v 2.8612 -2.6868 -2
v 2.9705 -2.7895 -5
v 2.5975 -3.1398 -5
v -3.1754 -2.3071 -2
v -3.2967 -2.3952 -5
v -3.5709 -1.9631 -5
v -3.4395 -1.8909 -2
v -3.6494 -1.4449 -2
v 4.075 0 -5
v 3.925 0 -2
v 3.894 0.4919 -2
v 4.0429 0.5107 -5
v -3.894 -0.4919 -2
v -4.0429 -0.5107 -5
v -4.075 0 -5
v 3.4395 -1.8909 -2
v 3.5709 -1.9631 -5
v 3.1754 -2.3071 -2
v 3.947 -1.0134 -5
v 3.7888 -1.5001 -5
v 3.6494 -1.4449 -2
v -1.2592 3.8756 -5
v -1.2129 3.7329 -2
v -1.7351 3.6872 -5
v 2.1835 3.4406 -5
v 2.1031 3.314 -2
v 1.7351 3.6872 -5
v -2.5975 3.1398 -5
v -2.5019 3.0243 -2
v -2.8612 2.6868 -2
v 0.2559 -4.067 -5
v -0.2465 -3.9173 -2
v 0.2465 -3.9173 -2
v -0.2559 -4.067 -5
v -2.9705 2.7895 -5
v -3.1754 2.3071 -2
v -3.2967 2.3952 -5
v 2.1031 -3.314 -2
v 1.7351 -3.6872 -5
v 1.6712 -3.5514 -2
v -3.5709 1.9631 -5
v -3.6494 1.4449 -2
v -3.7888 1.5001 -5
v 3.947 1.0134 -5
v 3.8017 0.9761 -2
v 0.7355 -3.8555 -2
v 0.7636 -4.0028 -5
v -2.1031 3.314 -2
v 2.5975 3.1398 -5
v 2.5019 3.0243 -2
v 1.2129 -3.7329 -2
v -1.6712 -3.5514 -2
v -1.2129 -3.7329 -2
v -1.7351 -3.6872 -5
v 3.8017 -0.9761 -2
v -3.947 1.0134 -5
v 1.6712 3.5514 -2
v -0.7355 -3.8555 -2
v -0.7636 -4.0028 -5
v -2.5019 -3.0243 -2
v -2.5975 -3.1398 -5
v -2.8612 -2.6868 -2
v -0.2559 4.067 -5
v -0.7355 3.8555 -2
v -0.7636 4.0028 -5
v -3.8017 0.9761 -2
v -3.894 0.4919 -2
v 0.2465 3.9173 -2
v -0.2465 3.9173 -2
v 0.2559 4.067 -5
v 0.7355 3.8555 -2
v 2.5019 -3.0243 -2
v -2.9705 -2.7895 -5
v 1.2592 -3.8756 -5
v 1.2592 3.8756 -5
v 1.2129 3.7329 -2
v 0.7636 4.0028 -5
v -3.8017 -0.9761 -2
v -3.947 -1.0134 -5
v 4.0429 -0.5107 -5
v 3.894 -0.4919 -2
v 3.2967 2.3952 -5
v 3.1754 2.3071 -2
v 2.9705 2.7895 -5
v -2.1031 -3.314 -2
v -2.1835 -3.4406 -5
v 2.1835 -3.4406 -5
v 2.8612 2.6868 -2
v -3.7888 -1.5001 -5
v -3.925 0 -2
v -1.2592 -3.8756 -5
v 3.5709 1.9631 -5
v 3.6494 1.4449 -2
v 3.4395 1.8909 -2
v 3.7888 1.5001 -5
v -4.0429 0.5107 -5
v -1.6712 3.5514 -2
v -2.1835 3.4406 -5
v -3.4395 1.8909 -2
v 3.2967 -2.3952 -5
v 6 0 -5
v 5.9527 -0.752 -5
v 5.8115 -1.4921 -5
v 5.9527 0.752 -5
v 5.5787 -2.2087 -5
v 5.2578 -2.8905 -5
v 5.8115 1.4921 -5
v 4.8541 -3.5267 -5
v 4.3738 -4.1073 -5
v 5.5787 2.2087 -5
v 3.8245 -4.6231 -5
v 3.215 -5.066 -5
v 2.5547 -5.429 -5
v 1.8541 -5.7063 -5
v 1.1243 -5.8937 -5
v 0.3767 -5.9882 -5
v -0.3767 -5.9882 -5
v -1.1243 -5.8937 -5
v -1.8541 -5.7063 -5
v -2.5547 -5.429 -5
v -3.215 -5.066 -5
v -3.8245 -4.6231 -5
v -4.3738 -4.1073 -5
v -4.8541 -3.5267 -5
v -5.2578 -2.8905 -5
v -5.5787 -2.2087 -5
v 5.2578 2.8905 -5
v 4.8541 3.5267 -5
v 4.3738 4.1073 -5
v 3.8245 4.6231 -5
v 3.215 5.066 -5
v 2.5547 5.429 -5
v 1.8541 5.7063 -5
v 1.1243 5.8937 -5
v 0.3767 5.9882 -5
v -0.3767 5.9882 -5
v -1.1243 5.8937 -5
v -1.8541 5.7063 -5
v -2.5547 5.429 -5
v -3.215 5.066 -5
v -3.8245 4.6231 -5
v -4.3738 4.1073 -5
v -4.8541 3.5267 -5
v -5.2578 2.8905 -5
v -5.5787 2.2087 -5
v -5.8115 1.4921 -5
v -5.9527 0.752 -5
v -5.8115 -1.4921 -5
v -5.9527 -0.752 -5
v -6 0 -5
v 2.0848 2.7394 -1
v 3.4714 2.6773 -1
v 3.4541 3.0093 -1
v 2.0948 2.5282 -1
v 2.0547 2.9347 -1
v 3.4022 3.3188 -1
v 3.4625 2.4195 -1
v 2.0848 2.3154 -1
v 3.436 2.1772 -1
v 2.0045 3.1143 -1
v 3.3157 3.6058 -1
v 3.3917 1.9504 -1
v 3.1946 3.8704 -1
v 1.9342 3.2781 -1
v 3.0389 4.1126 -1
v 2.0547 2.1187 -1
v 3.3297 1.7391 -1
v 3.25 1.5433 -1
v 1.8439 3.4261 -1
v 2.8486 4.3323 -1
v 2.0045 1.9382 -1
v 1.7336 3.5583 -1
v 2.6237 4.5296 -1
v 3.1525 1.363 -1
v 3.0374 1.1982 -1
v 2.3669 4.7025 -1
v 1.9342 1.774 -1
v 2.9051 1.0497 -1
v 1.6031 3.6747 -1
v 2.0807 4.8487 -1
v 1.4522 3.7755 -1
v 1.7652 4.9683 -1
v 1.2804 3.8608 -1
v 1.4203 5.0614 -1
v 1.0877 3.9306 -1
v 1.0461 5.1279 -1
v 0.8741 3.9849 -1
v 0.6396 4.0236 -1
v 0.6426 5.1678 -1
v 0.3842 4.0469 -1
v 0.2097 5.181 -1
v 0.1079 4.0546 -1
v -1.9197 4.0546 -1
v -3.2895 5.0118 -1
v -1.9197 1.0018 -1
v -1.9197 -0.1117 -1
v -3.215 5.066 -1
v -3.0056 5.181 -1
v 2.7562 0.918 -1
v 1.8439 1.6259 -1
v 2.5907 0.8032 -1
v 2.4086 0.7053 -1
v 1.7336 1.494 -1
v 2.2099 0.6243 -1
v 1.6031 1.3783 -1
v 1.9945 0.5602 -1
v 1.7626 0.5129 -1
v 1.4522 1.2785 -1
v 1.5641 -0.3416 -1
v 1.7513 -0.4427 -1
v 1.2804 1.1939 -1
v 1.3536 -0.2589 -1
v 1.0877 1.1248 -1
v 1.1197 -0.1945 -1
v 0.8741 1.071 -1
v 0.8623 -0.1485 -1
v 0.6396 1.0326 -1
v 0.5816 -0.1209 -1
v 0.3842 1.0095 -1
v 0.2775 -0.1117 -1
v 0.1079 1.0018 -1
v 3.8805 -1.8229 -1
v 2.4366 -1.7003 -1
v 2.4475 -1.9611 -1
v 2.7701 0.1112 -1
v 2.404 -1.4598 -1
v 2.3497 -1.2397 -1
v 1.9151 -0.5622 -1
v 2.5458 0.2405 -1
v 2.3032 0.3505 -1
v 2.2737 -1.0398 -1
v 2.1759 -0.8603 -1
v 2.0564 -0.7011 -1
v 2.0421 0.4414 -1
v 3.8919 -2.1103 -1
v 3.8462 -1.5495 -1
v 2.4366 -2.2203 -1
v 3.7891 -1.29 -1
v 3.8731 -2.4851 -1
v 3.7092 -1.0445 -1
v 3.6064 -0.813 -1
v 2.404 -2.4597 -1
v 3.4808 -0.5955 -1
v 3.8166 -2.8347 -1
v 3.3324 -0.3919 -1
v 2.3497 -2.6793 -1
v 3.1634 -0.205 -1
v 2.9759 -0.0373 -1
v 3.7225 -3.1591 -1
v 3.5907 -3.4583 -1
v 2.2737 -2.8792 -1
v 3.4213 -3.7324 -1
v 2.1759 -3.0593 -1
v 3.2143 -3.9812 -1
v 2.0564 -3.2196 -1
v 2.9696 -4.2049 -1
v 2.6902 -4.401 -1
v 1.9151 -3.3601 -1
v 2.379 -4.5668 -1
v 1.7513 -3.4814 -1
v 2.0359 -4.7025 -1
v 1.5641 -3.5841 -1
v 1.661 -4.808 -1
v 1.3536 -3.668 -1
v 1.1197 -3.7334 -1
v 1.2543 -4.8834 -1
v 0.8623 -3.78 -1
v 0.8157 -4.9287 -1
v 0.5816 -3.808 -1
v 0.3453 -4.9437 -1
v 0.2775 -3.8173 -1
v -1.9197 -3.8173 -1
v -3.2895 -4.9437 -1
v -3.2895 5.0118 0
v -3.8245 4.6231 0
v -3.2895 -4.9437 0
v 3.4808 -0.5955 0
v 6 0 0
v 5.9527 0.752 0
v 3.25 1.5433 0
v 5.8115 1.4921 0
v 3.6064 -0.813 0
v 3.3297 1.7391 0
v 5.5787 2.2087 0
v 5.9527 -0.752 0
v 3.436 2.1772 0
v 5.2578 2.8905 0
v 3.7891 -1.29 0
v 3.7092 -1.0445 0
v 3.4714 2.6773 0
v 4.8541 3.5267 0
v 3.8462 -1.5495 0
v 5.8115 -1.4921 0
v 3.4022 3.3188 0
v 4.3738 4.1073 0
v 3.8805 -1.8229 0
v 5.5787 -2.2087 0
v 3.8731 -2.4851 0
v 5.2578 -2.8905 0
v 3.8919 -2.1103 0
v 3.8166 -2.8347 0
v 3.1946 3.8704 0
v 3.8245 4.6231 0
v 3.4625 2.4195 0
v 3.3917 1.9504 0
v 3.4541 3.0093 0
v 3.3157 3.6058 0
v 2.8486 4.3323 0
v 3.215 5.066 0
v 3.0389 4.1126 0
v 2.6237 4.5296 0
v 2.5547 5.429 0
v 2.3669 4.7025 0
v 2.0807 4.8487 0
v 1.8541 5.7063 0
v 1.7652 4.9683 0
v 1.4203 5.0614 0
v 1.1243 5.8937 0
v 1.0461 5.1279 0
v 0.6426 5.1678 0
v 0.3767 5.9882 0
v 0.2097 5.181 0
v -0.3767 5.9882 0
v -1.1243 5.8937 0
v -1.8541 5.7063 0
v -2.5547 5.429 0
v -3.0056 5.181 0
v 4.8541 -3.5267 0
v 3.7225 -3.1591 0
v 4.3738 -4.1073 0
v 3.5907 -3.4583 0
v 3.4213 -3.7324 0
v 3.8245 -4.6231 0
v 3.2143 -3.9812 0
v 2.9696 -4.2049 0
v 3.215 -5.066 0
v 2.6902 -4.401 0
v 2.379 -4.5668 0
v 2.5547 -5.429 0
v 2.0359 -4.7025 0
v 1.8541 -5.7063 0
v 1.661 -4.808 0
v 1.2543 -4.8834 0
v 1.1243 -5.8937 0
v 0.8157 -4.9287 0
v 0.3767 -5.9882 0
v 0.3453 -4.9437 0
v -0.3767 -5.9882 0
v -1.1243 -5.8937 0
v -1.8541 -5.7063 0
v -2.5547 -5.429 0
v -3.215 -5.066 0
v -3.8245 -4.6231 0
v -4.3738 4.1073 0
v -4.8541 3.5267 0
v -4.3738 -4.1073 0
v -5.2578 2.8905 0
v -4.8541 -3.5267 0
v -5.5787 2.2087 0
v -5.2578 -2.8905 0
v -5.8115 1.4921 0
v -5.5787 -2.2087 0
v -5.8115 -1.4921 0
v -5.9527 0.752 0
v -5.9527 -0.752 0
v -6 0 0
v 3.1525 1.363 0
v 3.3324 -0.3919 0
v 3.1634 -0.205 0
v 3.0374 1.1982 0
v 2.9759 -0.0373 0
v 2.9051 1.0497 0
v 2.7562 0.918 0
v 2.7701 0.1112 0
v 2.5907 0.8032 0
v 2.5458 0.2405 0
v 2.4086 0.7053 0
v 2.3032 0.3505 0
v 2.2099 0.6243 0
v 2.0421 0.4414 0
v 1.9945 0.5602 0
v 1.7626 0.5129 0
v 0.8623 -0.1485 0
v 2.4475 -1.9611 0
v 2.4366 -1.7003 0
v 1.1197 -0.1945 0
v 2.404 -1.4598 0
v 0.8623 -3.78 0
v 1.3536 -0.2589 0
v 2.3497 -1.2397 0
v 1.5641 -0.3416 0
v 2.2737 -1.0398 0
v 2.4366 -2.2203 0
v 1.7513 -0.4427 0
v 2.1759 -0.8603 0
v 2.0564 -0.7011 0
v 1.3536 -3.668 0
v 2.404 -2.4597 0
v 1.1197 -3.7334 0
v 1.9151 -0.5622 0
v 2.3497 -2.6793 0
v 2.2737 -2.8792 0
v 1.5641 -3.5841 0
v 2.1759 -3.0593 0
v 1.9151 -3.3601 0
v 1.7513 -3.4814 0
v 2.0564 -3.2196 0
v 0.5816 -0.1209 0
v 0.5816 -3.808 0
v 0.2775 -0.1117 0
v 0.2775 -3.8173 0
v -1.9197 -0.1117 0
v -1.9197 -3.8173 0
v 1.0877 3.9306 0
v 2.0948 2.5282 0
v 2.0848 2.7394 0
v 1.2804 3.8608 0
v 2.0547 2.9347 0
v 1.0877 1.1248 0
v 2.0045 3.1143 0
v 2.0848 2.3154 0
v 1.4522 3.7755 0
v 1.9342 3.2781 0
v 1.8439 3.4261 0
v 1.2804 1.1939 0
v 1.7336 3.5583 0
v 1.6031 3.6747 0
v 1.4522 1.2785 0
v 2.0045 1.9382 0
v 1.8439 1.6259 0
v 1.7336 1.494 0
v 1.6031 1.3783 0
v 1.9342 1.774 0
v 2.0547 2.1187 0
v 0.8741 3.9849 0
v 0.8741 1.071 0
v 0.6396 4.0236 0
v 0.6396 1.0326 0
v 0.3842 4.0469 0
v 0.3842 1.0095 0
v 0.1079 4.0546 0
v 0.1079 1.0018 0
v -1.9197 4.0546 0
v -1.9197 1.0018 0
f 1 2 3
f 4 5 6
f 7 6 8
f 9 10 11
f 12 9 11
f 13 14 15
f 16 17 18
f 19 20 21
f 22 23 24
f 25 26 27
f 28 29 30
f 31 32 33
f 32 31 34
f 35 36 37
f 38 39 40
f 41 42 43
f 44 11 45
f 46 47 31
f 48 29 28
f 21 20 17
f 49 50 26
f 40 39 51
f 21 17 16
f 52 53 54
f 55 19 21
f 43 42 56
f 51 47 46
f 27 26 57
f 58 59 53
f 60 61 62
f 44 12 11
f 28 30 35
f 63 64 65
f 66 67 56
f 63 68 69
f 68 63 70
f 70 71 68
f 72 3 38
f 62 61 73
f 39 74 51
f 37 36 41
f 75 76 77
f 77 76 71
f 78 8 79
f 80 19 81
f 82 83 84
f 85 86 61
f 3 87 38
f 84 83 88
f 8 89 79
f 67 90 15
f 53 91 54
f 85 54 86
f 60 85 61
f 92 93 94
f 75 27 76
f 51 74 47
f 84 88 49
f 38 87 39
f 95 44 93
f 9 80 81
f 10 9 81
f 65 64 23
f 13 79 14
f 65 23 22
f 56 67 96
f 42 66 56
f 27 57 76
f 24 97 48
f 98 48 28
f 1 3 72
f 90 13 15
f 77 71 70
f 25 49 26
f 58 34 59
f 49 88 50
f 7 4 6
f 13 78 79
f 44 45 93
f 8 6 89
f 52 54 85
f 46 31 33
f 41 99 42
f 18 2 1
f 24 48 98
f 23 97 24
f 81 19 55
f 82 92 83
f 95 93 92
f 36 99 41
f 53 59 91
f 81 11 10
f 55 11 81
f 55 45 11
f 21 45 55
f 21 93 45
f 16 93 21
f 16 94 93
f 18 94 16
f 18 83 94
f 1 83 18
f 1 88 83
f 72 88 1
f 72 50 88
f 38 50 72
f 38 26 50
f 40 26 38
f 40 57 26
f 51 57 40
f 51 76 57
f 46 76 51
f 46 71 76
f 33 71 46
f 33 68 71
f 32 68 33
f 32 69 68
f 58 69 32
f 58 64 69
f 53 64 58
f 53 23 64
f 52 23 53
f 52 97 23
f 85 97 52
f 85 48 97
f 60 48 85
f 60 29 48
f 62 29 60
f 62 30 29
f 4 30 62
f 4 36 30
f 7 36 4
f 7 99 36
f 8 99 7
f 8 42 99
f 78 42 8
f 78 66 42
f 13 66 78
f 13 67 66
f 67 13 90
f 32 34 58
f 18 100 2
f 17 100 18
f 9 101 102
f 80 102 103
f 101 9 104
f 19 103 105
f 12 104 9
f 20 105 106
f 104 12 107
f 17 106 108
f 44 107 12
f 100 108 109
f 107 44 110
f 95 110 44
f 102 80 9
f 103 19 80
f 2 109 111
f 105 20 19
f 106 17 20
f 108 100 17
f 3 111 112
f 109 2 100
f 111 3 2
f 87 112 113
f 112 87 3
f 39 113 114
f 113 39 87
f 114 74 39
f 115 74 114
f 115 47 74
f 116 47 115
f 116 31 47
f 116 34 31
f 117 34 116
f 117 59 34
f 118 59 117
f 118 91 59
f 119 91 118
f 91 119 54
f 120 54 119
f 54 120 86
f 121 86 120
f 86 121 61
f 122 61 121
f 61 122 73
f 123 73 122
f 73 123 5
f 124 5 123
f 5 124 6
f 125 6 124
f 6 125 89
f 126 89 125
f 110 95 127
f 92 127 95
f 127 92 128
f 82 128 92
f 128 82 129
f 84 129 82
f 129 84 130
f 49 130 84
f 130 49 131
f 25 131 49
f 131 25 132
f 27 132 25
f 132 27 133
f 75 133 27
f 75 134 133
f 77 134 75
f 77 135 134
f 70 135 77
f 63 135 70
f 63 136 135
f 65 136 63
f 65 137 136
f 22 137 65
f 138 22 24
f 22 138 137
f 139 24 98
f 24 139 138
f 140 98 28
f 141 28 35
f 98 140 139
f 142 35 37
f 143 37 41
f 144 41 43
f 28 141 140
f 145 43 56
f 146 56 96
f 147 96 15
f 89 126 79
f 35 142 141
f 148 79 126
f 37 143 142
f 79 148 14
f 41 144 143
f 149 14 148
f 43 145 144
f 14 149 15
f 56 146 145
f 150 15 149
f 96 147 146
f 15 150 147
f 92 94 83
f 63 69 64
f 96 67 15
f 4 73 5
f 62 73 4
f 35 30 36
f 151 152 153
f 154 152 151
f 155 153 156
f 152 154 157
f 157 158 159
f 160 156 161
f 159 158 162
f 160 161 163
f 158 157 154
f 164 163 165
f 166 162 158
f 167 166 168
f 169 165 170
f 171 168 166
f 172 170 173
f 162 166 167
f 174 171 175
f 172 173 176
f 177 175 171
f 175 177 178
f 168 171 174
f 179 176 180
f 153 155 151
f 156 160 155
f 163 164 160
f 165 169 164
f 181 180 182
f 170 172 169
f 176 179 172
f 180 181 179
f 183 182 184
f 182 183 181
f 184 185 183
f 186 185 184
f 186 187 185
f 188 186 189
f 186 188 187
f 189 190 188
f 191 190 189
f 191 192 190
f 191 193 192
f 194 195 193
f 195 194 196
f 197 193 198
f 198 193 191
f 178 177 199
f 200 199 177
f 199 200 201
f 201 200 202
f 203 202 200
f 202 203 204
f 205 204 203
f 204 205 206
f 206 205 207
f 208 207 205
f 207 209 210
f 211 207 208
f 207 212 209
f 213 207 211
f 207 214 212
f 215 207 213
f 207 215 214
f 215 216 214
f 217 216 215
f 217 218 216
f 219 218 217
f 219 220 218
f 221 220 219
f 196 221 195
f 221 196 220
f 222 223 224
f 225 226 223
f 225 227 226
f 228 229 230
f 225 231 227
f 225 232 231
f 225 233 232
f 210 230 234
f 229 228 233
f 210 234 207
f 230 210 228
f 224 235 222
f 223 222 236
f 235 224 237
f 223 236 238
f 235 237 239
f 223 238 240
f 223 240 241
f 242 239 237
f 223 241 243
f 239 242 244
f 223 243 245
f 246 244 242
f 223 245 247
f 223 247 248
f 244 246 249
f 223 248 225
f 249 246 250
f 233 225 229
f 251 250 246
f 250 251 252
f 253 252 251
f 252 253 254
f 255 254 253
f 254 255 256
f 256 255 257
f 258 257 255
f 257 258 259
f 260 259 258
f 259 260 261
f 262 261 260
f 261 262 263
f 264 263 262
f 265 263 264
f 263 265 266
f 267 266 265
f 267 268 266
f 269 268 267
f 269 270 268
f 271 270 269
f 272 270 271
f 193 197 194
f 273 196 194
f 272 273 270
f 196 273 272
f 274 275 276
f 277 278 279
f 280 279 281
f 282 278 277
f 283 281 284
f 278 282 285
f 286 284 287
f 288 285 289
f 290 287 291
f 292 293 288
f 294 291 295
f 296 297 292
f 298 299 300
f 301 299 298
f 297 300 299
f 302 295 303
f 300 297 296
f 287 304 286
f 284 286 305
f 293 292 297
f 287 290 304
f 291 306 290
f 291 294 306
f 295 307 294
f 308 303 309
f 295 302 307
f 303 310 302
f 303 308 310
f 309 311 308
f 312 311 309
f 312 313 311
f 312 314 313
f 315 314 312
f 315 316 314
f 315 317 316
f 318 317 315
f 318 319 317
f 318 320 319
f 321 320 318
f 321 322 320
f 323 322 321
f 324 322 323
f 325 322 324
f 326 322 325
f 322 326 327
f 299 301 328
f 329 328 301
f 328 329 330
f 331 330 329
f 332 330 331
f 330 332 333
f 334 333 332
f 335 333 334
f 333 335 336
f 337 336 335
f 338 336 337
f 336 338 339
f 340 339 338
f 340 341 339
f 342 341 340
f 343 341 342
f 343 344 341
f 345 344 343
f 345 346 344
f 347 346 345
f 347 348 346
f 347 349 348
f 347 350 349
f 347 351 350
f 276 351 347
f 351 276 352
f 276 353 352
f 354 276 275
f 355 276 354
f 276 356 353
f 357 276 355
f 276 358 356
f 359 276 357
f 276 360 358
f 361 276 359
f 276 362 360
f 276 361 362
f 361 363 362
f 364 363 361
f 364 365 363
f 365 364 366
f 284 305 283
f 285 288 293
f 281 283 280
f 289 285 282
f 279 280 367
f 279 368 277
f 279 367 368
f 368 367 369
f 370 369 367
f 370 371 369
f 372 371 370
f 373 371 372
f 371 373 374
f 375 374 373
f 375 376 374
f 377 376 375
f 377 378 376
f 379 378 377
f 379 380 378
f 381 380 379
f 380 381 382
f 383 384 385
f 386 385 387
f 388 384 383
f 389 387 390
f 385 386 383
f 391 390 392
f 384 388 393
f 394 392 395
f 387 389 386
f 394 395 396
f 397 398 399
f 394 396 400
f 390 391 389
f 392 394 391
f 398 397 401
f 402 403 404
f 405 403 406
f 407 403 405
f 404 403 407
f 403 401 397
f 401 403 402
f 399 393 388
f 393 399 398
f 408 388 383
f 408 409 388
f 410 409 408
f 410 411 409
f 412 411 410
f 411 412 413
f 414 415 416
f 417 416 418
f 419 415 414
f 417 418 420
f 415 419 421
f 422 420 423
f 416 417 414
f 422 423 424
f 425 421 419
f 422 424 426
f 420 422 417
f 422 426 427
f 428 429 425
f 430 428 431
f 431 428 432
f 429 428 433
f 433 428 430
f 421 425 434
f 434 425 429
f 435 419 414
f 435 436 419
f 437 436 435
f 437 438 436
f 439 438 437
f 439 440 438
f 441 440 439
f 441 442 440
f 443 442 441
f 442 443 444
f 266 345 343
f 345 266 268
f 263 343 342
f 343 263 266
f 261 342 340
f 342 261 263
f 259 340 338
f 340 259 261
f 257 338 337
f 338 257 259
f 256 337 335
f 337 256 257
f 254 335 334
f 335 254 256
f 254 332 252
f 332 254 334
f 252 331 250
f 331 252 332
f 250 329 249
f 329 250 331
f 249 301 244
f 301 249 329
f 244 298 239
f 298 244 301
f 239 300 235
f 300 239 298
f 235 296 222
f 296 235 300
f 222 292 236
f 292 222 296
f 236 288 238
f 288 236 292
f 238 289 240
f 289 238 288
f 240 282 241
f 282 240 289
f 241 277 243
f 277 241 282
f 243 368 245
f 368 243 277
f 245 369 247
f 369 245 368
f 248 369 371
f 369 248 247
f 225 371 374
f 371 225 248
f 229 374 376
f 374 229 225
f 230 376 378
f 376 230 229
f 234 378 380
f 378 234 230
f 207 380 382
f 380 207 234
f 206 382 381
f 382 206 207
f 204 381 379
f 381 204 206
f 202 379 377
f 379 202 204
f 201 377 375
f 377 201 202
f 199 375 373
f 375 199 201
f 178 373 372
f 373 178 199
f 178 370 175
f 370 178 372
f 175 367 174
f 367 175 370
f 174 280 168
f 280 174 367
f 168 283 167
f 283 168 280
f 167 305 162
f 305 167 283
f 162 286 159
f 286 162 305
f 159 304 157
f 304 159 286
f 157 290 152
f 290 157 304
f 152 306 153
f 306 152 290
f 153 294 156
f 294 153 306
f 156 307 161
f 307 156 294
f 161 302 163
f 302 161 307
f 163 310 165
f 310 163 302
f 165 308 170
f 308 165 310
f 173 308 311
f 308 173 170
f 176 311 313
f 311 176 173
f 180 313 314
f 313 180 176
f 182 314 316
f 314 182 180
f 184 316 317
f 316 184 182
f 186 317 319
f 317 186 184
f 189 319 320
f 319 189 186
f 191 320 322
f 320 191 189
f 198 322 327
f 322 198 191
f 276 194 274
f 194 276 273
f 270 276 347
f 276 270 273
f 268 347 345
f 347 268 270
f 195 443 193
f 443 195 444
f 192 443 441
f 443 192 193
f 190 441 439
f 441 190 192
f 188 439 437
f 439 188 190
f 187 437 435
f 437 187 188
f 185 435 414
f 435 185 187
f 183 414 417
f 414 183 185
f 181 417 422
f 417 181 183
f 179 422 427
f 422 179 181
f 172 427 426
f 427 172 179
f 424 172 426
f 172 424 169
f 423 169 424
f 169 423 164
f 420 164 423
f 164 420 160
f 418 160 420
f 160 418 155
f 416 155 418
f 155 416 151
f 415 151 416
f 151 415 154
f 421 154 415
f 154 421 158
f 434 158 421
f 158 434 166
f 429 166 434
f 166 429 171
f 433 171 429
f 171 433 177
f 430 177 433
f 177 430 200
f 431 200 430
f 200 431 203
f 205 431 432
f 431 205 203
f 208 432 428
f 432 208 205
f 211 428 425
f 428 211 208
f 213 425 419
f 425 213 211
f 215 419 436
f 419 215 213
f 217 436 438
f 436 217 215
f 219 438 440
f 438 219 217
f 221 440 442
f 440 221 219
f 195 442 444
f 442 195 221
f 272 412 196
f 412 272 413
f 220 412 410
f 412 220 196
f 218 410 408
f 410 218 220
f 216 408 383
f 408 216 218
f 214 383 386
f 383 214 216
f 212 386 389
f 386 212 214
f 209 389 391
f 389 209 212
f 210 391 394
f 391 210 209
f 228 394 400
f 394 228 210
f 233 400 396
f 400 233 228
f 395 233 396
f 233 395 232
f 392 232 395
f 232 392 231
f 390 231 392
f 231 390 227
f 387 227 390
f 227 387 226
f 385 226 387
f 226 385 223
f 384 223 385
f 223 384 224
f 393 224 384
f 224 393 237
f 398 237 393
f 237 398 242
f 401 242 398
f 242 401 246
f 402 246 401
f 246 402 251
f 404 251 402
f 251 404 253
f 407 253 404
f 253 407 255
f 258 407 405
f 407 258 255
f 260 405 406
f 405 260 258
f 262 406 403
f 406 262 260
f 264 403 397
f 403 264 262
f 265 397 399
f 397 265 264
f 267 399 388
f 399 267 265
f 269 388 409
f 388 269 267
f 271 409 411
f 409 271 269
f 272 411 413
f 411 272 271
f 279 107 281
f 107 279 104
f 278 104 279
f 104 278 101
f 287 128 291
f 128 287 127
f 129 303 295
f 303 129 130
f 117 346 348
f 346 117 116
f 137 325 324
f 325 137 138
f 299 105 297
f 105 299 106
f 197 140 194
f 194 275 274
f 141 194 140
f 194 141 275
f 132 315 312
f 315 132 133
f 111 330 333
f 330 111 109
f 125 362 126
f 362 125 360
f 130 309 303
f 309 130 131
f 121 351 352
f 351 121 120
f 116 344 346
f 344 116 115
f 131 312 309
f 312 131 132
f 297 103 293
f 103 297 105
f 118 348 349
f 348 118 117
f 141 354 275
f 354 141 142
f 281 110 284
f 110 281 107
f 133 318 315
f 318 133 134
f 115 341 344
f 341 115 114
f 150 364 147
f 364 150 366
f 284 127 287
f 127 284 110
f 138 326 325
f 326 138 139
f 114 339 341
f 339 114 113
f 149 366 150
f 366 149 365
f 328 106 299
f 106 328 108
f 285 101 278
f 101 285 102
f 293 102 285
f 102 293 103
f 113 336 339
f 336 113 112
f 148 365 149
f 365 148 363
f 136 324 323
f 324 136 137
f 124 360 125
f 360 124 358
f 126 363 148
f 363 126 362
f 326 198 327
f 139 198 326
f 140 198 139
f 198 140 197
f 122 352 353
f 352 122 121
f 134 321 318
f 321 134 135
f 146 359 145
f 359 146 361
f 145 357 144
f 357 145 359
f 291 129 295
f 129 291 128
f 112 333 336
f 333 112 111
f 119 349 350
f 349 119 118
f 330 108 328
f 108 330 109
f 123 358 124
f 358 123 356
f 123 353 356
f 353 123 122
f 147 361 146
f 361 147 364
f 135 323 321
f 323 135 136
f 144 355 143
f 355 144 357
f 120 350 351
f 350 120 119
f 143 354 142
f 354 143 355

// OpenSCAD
$fn = 50;

difference() {
	union() {
		translate(v = [0, 0, -5.0]) {
			cylinder(h = 5, r = 6.0);
		}
	}
	union() {
		#translate(v = [0, 0, -5.0]) {
			cylinder(h = 3, r1 = 4.075, r2 = 3.925);
		}
		translate(v = [0, 0, -1]) {
			linear_extrude(height = 1) {
				text(font = "Impact", halign = "center", size = 10, text = "B", valign = "center");
			}
		}
	}
}
